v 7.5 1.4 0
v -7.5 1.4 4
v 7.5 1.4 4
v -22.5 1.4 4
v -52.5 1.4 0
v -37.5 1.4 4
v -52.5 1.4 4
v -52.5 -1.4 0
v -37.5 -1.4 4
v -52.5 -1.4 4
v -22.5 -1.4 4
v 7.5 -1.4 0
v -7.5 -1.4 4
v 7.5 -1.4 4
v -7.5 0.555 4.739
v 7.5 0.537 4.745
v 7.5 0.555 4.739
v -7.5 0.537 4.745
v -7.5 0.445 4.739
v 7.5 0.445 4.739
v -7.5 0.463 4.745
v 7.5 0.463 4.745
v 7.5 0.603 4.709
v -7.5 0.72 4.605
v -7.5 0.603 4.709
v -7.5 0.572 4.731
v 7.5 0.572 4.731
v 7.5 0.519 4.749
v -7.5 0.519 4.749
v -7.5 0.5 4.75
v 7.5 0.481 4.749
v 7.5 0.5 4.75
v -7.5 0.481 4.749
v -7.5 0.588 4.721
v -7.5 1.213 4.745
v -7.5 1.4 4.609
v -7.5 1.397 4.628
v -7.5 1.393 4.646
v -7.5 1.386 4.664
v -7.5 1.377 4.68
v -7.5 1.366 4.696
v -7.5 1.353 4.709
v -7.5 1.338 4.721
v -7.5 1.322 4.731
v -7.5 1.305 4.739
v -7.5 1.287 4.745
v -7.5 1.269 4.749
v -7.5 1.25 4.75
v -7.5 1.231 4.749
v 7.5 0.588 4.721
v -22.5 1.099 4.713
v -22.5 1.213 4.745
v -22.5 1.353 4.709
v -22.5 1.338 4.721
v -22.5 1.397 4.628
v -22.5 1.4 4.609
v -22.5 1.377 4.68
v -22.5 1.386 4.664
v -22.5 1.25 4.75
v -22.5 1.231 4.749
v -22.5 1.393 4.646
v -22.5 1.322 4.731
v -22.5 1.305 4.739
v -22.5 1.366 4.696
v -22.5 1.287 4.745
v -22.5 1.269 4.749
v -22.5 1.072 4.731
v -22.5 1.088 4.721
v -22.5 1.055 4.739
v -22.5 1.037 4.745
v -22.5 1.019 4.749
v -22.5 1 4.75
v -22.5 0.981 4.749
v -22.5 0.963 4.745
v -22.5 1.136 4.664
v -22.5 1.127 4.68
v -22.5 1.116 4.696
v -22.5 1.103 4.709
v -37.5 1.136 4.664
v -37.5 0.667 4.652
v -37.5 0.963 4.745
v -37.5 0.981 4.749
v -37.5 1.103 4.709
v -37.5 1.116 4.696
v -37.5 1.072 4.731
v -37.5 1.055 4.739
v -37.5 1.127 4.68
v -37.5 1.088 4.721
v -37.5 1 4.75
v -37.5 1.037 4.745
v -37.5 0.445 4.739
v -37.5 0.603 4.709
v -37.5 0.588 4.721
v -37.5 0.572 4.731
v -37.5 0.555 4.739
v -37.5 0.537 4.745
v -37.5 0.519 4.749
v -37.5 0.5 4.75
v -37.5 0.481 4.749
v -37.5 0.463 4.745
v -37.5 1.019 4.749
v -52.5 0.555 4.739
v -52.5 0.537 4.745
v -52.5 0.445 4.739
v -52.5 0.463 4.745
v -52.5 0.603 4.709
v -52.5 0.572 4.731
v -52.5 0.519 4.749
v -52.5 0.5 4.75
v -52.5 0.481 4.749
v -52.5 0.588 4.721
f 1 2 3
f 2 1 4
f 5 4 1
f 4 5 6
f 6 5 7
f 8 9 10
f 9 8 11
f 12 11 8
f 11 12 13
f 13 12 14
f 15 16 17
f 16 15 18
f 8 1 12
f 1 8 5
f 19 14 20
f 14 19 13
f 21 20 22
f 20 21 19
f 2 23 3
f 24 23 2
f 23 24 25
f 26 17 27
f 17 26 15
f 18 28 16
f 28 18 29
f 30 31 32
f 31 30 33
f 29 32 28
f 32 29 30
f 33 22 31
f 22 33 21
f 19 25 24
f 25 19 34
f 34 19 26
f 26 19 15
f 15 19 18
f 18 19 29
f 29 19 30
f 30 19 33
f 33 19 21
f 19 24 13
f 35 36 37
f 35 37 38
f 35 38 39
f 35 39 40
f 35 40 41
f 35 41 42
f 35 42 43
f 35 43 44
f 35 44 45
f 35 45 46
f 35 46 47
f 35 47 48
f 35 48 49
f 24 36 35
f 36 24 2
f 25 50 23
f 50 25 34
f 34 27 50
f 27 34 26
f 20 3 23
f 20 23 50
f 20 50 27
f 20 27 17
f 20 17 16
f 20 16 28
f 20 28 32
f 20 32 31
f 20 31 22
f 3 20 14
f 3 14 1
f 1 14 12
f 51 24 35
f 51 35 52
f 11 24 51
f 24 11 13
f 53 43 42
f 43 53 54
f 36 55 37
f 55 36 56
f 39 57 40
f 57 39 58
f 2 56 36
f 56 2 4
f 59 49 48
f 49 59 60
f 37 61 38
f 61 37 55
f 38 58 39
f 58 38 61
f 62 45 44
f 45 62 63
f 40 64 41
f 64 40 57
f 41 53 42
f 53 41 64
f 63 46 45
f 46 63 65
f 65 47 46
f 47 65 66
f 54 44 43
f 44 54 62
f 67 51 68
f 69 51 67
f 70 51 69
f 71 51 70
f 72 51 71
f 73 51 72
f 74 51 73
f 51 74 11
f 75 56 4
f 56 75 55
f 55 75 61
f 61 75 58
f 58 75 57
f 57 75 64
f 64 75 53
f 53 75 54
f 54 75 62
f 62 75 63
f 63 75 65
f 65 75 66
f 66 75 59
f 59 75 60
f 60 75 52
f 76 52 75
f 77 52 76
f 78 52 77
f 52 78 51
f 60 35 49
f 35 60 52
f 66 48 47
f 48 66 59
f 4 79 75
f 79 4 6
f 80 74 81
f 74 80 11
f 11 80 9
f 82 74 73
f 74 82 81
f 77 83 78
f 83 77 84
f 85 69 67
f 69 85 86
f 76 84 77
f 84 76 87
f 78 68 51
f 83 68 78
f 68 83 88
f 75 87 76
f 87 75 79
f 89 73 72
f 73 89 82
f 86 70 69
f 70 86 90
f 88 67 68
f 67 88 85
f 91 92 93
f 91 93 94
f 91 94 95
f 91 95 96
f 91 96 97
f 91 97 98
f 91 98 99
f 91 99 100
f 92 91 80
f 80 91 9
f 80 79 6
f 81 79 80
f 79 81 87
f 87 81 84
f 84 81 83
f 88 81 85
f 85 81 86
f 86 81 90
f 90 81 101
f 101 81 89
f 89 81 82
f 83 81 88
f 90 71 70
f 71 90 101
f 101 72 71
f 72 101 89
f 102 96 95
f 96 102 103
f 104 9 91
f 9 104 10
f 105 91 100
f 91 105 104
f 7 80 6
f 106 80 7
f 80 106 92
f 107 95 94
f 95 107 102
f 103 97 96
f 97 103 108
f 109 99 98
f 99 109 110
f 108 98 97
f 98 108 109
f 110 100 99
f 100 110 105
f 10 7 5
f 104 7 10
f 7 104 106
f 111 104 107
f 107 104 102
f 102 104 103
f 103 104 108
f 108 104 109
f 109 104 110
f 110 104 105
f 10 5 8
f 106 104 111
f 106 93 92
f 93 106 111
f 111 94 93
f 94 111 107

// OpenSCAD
$fn=50;

sl = 60;  // saddle slot length
st = 2.8;   // saddle slot thick
ss = 4;   // saddle slot depth
sh = 0.75;   // saddle height above slot
sr = 0.15;  // saddle radius

xos = [ 0.5, 1.25, 1, 0.5 ];  // string offsets

xn = len(xos);
xl = sl / xn;

for (n = [0:xn-1]) {
    translate([-xl*n,0,0]) {
        hull() {
            translate([0,0,ss/2]) cube([xl,st,ss], center=true);
            #translate([0,xos[n],ss+sh-sr]) rotate([0,90,0]) cylinder(h=xl, r=sr, center=true);
        }
    }
}
